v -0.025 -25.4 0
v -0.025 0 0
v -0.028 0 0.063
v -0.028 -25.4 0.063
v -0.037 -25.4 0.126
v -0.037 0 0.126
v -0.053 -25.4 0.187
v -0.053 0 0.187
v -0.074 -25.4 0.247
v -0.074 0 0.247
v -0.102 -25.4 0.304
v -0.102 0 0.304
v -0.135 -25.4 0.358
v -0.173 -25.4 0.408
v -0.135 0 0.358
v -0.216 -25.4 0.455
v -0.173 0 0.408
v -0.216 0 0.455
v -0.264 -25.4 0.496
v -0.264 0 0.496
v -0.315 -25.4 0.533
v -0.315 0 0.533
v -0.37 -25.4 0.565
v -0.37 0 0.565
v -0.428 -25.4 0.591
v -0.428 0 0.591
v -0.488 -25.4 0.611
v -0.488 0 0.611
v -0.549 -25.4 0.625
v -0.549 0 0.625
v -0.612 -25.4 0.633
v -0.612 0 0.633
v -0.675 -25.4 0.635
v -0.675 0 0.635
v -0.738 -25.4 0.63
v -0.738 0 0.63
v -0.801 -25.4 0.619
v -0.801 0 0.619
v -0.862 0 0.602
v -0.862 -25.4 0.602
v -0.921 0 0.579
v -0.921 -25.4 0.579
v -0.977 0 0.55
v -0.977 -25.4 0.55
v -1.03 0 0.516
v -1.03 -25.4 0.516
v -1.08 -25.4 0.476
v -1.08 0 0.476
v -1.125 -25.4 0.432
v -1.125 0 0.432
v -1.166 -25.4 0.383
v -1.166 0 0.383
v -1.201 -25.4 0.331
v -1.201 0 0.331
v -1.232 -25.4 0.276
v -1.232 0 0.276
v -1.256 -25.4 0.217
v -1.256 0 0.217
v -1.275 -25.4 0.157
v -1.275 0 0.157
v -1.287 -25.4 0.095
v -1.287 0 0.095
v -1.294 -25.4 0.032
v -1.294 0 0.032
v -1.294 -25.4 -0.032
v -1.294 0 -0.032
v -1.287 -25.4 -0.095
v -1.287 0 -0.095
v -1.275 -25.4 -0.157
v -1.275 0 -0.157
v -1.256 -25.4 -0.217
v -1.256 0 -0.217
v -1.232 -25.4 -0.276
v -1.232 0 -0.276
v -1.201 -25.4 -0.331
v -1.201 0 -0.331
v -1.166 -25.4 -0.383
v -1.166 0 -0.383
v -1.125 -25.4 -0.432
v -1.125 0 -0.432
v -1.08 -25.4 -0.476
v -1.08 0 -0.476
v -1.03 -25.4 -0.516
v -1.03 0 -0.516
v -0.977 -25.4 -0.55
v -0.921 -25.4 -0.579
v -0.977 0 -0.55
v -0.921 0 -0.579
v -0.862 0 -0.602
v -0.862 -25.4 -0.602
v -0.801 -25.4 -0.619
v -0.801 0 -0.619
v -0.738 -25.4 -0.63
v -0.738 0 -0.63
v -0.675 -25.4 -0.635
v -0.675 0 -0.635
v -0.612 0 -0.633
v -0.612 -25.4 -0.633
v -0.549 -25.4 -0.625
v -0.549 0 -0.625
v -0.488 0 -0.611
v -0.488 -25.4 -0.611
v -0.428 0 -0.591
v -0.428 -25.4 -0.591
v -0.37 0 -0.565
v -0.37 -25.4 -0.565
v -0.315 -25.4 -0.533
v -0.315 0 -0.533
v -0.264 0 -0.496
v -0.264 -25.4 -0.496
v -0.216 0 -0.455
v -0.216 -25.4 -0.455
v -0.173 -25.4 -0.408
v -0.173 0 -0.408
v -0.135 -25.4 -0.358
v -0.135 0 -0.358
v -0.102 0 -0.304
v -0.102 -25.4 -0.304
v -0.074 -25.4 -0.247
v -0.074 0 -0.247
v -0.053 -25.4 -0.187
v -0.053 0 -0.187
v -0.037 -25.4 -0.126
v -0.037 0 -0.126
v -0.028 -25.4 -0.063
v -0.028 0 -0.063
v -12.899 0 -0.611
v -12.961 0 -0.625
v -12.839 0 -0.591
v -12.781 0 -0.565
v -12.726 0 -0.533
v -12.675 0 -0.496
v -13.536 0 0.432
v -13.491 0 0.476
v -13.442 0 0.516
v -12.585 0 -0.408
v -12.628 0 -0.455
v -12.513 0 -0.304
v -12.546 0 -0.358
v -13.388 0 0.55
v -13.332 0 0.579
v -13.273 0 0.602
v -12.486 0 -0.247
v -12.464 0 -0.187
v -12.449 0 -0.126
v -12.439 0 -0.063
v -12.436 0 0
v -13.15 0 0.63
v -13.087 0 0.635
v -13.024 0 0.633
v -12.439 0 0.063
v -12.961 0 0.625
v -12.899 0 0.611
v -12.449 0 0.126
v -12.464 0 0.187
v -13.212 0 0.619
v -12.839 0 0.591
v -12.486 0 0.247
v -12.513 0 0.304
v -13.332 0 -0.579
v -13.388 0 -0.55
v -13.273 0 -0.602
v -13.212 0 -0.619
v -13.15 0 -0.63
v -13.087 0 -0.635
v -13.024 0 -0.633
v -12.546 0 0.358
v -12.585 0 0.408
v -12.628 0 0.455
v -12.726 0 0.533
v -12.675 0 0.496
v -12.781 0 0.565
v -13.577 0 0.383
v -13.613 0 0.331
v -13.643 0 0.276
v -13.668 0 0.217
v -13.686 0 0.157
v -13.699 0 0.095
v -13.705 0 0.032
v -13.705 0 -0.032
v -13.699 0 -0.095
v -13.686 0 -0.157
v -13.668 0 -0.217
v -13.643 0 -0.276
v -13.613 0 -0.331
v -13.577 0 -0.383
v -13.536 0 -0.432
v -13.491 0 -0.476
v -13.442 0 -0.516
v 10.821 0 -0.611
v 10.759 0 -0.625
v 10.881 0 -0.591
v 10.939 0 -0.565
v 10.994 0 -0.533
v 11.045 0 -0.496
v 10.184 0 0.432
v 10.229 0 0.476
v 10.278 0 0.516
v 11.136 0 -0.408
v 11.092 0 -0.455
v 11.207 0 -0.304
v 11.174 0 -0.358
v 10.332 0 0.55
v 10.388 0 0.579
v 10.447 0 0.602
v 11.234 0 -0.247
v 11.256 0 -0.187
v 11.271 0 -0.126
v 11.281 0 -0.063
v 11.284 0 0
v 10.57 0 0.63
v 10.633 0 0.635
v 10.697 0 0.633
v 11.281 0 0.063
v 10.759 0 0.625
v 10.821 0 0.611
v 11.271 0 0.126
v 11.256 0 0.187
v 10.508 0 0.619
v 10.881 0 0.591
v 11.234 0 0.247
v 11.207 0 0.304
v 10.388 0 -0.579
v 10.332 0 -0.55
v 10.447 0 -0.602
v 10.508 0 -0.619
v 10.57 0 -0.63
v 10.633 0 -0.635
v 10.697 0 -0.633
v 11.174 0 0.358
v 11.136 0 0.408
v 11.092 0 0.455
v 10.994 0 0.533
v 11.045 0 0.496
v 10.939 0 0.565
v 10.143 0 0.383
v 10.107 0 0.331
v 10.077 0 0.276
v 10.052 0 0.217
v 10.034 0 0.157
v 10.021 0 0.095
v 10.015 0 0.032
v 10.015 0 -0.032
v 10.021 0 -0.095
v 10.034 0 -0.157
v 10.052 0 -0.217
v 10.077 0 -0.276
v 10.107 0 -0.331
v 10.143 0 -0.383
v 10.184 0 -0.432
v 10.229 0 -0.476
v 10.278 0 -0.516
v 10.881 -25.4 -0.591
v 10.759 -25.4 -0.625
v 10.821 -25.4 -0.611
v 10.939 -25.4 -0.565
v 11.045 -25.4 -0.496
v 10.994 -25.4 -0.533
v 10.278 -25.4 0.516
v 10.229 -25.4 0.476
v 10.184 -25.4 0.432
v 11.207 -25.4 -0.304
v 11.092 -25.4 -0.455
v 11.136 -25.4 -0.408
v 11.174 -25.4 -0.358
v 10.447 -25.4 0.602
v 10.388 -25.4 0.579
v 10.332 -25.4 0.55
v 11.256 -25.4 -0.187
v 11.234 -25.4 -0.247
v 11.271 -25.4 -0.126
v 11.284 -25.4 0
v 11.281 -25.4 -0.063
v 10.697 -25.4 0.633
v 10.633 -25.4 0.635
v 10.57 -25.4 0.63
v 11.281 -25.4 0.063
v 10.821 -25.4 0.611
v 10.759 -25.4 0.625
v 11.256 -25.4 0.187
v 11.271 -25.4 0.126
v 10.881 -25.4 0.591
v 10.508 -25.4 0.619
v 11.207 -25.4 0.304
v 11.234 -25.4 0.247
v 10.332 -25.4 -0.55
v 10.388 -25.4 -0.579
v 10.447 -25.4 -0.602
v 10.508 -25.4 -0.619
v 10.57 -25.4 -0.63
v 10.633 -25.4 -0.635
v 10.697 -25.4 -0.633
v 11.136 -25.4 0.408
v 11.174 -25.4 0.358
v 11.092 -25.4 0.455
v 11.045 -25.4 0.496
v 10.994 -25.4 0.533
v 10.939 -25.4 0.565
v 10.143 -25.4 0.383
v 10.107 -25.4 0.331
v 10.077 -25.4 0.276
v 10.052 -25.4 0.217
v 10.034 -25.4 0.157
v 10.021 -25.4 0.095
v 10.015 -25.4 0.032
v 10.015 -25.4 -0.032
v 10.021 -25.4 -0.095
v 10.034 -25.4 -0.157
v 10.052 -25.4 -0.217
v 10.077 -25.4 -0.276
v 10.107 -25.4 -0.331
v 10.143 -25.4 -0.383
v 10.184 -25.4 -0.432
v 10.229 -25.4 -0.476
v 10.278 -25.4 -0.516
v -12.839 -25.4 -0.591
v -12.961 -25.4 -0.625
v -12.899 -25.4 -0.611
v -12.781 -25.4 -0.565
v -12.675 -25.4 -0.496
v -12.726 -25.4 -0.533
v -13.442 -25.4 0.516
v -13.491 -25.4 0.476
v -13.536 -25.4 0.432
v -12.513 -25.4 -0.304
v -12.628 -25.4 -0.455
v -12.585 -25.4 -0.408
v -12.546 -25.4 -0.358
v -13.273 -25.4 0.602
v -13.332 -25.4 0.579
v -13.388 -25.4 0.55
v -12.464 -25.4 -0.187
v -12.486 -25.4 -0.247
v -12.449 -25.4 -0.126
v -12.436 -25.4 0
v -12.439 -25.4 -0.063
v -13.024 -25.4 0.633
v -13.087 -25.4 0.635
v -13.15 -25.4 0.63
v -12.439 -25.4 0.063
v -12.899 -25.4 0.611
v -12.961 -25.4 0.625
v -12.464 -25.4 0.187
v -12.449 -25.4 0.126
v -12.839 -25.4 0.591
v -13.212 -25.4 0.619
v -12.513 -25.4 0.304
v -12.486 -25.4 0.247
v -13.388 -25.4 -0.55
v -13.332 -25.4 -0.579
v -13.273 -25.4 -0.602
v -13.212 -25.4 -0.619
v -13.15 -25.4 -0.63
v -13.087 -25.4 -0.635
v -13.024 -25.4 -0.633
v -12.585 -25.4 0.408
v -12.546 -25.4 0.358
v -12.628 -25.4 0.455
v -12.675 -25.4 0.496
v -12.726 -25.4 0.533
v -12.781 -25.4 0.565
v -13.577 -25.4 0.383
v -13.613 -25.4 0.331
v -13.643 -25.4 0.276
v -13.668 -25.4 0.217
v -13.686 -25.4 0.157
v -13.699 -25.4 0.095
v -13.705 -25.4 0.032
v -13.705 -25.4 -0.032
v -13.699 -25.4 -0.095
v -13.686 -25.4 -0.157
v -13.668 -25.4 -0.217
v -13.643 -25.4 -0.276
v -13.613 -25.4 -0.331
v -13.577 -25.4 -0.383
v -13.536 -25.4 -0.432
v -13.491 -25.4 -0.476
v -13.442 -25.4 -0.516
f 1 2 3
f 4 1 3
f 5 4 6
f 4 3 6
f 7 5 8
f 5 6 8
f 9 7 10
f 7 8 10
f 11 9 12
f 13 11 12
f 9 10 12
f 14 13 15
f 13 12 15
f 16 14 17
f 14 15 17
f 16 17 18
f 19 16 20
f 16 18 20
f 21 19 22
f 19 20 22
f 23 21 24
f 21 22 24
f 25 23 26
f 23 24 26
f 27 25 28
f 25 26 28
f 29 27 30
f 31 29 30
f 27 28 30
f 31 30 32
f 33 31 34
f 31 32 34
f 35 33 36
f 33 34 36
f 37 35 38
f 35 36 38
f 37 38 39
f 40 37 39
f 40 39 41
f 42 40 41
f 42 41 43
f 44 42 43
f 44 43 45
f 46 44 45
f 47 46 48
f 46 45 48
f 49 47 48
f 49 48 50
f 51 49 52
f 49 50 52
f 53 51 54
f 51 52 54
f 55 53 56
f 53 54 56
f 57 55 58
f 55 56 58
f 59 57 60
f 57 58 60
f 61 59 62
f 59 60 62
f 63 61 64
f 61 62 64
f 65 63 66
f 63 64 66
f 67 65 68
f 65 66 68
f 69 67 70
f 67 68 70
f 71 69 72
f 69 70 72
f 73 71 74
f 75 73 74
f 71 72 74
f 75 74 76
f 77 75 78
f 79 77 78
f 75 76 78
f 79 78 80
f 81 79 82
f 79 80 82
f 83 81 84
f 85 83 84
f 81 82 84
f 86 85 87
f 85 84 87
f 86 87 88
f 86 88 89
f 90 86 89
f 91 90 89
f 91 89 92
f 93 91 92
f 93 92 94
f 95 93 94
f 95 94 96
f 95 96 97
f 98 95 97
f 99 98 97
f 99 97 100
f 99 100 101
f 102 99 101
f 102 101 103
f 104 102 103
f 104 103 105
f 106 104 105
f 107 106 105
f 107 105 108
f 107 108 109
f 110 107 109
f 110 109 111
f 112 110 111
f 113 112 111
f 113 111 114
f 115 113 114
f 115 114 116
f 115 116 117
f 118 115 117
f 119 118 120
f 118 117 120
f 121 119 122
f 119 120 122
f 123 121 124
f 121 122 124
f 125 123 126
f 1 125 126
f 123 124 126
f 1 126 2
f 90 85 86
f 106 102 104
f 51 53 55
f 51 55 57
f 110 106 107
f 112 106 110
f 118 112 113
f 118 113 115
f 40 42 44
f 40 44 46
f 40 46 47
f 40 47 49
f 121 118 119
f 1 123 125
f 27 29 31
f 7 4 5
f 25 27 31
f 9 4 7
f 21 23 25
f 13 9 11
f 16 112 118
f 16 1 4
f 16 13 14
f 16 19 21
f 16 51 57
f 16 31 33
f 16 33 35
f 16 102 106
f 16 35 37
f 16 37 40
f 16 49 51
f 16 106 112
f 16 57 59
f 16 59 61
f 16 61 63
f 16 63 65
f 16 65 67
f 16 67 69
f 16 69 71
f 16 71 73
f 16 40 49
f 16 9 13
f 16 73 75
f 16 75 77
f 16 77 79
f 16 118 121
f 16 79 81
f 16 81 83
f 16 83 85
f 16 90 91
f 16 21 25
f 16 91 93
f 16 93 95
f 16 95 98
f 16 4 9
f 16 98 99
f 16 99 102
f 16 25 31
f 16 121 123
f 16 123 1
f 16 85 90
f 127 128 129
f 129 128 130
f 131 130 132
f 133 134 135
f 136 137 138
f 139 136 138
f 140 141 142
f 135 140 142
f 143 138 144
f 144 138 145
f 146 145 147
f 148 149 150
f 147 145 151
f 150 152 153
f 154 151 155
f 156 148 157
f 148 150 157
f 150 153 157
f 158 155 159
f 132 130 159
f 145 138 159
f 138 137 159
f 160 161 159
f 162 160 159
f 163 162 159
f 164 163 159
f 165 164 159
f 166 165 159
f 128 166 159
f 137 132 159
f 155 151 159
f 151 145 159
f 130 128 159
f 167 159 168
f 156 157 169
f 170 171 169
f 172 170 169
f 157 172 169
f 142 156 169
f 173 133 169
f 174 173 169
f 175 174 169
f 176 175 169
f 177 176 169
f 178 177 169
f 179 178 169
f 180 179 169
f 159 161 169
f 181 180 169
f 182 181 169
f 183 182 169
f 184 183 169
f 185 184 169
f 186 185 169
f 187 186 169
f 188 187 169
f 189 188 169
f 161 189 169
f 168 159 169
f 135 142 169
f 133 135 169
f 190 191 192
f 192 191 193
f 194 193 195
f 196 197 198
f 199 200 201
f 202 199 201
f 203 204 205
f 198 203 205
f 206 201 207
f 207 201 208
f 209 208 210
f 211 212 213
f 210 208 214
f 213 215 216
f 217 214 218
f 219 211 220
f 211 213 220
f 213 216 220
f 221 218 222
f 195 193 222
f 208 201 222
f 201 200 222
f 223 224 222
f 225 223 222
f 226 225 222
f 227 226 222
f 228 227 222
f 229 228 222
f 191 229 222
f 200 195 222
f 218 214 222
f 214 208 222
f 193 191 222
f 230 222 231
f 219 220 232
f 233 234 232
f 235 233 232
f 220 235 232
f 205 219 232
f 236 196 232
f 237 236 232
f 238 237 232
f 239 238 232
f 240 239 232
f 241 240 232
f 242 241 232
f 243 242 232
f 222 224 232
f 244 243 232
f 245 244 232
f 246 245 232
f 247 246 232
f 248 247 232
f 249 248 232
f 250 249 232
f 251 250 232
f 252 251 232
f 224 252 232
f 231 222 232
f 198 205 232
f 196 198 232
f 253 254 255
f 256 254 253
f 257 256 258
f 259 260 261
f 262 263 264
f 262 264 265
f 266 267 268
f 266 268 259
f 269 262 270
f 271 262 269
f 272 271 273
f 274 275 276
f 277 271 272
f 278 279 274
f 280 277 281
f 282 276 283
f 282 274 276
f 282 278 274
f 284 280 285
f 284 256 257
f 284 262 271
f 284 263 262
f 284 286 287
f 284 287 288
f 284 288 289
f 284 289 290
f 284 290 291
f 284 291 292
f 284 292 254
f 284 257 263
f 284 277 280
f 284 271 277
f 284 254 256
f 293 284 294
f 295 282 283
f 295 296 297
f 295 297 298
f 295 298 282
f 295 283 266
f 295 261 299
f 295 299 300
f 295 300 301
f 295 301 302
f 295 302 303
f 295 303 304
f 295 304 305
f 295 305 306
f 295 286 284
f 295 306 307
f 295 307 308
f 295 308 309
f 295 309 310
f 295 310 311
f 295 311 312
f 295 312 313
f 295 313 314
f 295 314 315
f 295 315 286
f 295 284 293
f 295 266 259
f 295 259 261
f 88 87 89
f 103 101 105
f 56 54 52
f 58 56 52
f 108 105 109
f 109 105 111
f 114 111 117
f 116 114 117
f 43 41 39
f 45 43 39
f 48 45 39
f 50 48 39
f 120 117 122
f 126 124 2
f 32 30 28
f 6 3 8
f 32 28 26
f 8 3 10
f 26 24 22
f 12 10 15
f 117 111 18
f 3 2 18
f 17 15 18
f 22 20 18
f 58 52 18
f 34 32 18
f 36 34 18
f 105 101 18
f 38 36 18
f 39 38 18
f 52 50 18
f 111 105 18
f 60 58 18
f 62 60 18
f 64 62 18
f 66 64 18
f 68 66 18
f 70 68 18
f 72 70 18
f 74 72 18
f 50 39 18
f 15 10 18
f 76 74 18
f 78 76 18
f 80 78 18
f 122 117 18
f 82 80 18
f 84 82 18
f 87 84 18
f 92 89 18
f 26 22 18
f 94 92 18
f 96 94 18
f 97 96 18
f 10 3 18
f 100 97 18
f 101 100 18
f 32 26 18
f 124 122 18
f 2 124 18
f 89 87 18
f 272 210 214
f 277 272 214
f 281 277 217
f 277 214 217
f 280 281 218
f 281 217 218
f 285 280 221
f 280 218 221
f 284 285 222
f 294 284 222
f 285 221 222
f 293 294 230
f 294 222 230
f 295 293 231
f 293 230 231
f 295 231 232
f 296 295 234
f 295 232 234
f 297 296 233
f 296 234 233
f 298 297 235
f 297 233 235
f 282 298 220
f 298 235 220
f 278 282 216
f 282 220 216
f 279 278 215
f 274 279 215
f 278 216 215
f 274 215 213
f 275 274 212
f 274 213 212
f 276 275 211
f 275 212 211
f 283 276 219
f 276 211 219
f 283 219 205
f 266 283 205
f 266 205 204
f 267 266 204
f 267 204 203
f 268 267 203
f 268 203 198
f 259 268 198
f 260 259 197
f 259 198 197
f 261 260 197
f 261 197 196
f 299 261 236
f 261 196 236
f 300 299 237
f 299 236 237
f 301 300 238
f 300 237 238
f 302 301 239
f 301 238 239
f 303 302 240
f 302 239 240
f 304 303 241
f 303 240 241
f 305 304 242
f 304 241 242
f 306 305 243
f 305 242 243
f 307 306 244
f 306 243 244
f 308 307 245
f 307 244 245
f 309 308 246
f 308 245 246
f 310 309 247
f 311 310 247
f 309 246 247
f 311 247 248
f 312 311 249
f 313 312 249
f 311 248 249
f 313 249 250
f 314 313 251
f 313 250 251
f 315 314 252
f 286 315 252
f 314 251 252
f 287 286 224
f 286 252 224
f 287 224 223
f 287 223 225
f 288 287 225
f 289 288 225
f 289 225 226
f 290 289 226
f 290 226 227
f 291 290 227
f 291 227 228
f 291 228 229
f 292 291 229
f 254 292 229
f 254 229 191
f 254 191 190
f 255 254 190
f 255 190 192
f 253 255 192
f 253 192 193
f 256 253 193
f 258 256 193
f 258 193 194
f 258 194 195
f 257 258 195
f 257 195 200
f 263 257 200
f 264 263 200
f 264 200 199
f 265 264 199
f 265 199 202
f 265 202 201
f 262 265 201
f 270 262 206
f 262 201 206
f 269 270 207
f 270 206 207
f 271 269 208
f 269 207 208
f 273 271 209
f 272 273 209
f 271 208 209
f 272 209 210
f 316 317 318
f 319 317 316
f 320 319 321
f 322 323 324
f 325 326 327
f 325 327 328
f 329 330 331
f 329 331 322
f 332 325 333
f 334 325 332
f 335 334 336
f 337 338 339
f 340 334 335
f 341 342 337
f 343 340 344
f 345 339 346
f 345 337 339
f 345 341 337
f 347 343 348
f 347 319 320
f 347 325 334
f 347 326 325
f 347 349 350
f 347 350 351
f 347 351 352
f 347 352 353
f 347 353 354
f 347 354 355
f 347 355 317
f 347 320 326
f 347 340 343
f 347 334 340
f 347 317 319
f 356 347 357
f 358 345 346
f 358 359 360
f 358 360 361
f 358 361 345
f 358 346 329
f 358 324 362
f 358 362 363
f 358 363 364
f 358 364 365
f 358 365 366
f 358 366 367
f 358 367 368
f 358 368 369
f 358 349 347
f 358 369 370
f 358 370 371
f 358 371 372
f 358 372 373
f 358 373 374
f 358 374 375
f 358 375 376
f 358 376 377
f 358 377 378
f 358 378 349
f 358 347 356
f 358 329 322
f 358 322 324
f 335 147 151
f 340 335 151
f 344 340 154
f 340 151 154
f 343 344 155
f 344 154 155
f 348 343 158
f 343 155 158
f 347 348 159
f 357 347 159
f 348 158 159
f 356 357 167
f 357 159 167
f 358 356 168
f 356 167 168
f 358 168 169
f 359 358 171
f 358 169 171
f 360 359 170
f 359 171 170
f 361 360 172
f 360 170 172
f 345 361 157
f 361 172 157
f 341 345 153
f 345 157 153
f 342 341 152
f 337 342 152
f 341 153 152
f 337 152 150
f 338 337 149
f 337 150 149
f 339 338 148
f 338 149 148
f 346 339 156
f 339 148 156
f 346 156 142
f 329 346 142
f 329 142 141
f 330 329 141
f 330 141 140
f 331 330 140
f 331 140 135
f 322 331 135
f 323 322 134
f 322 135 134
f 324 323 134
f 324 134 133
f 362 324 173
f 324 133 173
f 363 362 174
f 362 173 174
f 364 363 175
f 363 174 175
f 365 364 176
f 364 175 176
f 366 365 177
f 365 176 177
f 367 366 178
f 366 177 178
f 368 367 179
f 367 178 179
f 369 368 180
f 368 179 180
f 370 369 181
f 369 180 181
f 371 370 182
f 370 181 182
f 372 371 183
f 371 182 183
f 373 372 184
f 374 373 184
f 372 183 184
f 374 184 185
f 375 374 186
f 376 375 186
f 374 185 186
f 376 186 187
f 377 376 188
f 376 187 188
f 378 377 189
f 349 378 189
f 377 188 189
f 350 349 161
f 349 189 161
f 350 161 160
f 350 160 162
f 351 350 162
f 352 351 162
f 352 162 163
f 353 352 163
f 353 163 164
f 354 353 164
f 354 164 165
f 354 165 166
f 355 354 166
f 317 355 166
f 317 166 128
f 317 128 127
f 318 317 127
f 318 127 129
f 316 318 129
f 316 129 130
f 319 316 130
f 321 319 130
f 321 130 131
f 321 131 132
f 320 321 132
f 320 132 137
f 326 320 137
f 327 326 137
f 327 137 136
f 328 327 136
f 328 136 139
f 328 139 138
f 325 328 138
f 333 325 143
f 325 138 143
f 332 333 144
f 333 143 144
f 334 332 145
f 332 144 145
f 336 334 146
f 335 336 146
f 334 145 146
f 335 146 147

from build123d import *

# Parameters (mm, degrees)
F0_R     = 0.635
F1_DEPTH = 25.4


with BuildPart() as f1:
    # F0 (on Front) → F1 (new body)
    with BuildSketch(Plane.XZ):
        with Locations((-0.659523, 0)):
            Circle(F0_R)
        with Locations((10.649065, 0)):
            Circle(F0_R)
        with Locations((-13.070963, 0)):
            Circle(F0_R)
    extrude(amount=F1_DEPTH)


solid = f1.part
